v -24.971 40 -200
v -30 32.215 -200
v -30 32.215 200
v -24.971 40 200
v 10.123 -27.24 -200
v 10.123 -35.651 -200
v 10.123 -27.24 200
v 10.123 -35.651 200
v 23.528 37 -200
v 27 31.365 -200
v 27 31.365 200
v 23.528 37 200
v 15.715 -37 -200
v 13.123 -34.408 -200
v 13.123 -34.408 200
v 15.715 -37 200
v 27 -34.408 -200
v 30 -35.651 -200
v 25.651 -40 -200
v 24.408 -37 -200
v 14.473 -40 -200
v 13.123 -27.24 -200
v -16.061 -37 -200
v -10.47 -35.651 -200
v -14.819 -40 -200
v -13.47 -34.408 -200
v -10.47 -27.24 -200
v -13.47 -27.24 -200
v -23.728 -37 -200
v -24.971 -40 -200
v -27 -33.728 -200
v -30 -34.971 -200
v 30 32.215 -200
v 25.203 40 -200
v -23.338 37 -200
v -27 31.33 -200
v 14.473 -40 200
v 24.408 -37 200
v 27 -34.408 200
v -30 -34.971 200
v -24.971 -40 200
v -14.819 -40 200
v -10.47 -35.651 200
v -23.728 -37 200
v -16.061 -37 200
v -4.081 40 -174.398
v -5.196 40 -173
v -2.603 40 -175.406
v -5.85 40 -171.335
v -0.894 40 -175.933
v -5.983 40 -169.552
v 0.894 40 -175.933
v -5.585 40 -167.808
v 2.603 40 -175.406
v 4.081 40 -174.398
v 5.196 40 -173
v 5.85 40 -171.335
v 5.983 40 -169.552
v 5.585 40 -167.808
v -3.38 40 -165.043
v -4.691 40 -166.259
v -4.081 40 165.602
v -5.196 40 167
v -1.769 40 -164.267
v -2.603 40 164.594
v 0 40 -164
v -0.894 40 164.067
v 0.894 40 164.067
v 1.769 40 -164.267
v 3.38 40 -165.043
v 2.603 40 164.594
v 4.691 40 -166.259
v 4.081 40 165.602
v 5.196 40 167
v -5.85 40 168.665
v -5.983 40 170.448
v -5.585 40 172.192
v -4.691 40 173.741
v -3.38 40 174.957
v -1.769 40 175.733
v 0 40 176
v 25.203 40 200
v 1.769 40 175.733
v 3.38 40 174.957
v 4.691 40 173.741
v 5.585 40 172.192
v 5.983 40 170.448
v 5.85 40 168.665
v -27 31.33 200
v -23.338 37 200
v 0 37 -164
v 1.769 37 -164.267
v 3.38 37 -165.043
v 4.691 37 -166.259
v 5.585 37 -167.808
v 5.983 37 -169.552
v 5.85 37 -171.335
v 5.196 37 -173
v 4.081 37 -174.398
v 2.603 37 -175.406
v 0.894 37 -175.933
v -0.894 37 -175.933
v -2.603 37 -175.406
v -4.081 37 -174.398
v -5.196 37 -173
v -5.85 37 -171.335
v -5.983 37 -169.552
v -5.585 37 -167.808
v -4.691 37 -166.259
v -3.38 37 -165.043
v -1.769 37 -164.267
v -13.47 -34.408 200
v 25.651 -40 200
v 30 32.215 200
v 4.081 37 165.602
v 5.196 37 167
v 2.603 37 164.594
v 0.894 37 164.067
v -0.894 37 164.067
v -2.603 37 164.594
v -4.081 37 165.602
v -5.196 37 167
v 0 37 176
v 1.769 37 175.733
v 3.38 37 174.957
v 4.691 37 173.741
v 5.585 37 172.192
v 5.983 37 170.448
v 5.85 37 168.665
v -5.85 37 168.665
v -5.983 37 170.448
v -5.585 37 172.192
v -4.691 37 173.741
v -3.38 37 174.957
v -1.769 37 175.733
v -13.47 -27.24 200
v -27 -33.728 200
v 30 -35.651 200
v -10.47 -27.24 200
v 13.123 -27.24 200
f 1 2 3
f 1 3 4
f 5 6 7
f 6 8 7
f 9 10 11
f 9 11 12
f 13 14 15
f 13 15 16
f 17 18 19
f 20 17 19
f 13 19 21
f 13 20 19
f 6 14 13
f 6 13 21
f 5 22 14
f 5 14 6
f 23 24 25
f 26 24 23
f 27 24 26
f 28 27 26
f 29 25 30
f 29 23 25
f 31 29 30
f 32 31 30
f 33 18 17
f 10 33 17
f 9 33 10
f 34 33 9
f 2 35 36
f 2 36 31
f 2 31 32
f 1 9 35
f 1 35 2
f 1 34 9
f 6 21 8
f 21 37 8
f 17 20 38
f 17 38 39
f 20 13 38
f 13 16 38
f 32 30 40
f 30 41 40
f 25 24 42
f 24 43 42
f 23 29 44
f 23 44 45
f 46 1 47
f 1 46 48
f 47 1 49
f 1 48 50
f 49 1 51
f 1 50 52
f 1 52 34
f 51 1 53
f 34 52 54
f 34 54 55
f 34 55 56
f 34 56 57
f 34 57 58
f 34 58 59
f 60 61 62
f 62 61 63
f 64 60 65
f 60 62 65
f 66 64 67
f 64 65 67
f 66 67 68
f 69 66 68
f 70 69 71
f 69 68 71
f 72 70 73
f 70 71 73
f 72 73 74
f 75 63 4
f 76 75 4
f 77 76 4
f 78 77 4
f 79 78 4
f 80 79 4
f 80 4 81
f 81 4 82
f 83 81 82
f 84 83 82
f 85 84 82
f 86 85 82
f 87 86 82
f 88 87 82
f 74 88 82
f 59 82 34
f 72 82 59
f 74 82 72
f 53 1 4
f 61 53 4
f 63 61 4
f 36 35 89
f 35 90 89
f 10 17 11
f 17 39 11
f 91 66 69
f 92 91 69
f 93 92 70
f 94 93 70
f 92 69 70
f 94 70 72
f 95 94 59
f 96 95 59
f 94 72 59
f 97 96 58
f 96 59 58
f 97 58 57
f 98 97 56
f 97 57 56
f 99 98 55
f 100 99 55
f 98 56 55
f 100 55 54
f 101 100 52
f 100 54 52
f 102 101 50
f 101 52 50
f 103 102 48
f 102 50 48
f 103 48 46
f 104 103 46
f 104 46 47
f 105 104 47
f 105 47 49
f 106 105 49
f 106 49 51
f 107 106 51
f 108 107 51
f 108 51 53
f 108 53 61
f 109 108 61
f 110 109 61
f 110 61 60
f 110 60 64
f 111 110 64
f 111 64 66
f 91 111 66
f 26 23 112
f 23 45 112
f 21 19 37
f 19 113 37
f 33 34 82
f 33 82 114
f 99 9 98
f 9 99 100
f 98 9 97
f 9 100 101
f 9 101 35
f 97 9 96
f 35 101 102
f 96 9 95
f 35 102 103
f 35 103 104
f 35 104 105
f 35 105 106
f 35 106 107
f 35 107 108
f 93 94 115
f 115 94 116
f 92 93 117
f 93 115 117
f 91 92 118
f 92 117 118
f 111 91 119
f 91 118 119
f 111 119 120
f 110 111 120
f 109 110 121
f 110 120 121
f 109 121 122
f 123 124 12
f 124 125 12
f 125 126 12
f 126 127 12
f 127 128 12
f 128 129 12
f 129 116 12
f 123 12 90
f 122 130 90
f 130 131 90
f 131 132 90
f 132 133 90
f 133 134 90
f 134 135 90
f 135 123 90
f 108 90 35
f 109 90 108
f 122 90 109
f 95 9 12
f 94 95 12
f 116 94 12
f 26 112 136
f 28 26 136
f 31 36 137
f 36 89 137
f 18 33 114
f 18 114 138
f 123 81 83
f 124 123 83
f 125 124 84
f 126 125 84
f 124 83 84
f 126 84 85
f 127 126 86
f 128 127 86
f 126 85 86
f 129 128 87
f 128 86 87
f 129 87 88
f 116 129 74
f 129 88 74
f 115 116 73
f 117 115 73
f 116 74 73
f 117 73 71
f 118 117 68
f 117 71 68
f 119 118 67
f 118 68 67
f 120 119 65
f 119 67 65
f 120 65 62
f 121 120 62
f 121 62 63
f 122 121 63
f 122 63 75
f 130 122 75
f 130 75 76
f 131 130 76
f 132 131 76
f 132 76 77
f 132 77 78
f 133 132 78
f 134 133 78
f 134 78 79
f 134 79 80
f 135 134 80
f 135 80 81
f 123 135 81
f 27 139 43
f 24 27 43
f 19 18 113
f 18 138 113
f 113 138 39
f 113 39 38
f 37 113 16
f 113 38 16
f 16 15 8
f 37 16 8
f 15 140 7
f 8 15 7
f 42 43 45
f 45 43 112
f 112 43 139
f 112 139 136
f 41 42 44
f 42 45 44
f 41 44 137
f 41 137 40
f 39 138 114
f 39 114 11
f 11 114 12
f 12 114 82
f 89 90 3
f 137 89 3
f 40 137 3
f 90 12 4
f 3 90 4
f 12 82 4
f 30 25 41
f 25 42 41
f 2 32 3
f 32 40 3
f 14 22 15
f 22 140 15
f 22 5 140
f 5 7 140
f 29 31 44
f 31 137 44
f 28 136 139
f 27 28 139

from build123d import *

# Parameters (mm, degrees)
SALIENTE_EXTRUIR1_DEPTH = 200
CROQUIS2_R              = 6
CORTAR_EXTRUIR1_DEPTH   = 400


with BuildPart() as part:
    # Croquis1 → Saliente-Extruir1 (new, symmetric)
    with BuildSketch(Plane.XY):
        Polygon((-10.469747898, -27.240151607), (-10.469747898, -35.650909673), (-14.818838224, -40), (-24.971054909, -40), (-30, -34.971054909), (-30, 32.215207139), (-24.971054909, 40), (25.20346735, 40), (30, 32.215207139), (30, -35.650909673), (25.650909673, -40), (14.472500162, -40), (10.123409835, -35.650909673), (10.123409835, -27.240151607), (13.123409835, -27.240151607), (13.123409835, -34.408268986), (15.715140849, -37), (24.408268986, -37), (27, -34.408268986), (27, 31.365191547), (23.528161609, 37), (-23.337516983, 37), (-27, 31.330486588), (-27, -33.728414222), (-23.728414222, -37), (-16.061478911, -37), (-13.469747898, -34.408268986), (-13.469747898, -27.240151607), align=None)
    extrude(amount=SALIENTE_EXTRUIR1_DEPTH, both=True)

    # Croquis2 → Cortar-Extruir1 (cut)
    with BuildSketch(Plane(origin=(0, 40, 0), x_dir=(1, 0, 0), z_dir=(0, 1, 0))):
        with Locations(Location((0, 170, 0), (0, 0, 270))):
            Circle(CROQUIS2_R)
        with Locations(Location((0, -170, 0), (0, 0, 270))):
            Circle(CROQUIS2_R)
    extrude(amount=-CORTAR_EXTRUIR1_DEPTH, mode=Mode.SUBTRACT)


solid = part.part
